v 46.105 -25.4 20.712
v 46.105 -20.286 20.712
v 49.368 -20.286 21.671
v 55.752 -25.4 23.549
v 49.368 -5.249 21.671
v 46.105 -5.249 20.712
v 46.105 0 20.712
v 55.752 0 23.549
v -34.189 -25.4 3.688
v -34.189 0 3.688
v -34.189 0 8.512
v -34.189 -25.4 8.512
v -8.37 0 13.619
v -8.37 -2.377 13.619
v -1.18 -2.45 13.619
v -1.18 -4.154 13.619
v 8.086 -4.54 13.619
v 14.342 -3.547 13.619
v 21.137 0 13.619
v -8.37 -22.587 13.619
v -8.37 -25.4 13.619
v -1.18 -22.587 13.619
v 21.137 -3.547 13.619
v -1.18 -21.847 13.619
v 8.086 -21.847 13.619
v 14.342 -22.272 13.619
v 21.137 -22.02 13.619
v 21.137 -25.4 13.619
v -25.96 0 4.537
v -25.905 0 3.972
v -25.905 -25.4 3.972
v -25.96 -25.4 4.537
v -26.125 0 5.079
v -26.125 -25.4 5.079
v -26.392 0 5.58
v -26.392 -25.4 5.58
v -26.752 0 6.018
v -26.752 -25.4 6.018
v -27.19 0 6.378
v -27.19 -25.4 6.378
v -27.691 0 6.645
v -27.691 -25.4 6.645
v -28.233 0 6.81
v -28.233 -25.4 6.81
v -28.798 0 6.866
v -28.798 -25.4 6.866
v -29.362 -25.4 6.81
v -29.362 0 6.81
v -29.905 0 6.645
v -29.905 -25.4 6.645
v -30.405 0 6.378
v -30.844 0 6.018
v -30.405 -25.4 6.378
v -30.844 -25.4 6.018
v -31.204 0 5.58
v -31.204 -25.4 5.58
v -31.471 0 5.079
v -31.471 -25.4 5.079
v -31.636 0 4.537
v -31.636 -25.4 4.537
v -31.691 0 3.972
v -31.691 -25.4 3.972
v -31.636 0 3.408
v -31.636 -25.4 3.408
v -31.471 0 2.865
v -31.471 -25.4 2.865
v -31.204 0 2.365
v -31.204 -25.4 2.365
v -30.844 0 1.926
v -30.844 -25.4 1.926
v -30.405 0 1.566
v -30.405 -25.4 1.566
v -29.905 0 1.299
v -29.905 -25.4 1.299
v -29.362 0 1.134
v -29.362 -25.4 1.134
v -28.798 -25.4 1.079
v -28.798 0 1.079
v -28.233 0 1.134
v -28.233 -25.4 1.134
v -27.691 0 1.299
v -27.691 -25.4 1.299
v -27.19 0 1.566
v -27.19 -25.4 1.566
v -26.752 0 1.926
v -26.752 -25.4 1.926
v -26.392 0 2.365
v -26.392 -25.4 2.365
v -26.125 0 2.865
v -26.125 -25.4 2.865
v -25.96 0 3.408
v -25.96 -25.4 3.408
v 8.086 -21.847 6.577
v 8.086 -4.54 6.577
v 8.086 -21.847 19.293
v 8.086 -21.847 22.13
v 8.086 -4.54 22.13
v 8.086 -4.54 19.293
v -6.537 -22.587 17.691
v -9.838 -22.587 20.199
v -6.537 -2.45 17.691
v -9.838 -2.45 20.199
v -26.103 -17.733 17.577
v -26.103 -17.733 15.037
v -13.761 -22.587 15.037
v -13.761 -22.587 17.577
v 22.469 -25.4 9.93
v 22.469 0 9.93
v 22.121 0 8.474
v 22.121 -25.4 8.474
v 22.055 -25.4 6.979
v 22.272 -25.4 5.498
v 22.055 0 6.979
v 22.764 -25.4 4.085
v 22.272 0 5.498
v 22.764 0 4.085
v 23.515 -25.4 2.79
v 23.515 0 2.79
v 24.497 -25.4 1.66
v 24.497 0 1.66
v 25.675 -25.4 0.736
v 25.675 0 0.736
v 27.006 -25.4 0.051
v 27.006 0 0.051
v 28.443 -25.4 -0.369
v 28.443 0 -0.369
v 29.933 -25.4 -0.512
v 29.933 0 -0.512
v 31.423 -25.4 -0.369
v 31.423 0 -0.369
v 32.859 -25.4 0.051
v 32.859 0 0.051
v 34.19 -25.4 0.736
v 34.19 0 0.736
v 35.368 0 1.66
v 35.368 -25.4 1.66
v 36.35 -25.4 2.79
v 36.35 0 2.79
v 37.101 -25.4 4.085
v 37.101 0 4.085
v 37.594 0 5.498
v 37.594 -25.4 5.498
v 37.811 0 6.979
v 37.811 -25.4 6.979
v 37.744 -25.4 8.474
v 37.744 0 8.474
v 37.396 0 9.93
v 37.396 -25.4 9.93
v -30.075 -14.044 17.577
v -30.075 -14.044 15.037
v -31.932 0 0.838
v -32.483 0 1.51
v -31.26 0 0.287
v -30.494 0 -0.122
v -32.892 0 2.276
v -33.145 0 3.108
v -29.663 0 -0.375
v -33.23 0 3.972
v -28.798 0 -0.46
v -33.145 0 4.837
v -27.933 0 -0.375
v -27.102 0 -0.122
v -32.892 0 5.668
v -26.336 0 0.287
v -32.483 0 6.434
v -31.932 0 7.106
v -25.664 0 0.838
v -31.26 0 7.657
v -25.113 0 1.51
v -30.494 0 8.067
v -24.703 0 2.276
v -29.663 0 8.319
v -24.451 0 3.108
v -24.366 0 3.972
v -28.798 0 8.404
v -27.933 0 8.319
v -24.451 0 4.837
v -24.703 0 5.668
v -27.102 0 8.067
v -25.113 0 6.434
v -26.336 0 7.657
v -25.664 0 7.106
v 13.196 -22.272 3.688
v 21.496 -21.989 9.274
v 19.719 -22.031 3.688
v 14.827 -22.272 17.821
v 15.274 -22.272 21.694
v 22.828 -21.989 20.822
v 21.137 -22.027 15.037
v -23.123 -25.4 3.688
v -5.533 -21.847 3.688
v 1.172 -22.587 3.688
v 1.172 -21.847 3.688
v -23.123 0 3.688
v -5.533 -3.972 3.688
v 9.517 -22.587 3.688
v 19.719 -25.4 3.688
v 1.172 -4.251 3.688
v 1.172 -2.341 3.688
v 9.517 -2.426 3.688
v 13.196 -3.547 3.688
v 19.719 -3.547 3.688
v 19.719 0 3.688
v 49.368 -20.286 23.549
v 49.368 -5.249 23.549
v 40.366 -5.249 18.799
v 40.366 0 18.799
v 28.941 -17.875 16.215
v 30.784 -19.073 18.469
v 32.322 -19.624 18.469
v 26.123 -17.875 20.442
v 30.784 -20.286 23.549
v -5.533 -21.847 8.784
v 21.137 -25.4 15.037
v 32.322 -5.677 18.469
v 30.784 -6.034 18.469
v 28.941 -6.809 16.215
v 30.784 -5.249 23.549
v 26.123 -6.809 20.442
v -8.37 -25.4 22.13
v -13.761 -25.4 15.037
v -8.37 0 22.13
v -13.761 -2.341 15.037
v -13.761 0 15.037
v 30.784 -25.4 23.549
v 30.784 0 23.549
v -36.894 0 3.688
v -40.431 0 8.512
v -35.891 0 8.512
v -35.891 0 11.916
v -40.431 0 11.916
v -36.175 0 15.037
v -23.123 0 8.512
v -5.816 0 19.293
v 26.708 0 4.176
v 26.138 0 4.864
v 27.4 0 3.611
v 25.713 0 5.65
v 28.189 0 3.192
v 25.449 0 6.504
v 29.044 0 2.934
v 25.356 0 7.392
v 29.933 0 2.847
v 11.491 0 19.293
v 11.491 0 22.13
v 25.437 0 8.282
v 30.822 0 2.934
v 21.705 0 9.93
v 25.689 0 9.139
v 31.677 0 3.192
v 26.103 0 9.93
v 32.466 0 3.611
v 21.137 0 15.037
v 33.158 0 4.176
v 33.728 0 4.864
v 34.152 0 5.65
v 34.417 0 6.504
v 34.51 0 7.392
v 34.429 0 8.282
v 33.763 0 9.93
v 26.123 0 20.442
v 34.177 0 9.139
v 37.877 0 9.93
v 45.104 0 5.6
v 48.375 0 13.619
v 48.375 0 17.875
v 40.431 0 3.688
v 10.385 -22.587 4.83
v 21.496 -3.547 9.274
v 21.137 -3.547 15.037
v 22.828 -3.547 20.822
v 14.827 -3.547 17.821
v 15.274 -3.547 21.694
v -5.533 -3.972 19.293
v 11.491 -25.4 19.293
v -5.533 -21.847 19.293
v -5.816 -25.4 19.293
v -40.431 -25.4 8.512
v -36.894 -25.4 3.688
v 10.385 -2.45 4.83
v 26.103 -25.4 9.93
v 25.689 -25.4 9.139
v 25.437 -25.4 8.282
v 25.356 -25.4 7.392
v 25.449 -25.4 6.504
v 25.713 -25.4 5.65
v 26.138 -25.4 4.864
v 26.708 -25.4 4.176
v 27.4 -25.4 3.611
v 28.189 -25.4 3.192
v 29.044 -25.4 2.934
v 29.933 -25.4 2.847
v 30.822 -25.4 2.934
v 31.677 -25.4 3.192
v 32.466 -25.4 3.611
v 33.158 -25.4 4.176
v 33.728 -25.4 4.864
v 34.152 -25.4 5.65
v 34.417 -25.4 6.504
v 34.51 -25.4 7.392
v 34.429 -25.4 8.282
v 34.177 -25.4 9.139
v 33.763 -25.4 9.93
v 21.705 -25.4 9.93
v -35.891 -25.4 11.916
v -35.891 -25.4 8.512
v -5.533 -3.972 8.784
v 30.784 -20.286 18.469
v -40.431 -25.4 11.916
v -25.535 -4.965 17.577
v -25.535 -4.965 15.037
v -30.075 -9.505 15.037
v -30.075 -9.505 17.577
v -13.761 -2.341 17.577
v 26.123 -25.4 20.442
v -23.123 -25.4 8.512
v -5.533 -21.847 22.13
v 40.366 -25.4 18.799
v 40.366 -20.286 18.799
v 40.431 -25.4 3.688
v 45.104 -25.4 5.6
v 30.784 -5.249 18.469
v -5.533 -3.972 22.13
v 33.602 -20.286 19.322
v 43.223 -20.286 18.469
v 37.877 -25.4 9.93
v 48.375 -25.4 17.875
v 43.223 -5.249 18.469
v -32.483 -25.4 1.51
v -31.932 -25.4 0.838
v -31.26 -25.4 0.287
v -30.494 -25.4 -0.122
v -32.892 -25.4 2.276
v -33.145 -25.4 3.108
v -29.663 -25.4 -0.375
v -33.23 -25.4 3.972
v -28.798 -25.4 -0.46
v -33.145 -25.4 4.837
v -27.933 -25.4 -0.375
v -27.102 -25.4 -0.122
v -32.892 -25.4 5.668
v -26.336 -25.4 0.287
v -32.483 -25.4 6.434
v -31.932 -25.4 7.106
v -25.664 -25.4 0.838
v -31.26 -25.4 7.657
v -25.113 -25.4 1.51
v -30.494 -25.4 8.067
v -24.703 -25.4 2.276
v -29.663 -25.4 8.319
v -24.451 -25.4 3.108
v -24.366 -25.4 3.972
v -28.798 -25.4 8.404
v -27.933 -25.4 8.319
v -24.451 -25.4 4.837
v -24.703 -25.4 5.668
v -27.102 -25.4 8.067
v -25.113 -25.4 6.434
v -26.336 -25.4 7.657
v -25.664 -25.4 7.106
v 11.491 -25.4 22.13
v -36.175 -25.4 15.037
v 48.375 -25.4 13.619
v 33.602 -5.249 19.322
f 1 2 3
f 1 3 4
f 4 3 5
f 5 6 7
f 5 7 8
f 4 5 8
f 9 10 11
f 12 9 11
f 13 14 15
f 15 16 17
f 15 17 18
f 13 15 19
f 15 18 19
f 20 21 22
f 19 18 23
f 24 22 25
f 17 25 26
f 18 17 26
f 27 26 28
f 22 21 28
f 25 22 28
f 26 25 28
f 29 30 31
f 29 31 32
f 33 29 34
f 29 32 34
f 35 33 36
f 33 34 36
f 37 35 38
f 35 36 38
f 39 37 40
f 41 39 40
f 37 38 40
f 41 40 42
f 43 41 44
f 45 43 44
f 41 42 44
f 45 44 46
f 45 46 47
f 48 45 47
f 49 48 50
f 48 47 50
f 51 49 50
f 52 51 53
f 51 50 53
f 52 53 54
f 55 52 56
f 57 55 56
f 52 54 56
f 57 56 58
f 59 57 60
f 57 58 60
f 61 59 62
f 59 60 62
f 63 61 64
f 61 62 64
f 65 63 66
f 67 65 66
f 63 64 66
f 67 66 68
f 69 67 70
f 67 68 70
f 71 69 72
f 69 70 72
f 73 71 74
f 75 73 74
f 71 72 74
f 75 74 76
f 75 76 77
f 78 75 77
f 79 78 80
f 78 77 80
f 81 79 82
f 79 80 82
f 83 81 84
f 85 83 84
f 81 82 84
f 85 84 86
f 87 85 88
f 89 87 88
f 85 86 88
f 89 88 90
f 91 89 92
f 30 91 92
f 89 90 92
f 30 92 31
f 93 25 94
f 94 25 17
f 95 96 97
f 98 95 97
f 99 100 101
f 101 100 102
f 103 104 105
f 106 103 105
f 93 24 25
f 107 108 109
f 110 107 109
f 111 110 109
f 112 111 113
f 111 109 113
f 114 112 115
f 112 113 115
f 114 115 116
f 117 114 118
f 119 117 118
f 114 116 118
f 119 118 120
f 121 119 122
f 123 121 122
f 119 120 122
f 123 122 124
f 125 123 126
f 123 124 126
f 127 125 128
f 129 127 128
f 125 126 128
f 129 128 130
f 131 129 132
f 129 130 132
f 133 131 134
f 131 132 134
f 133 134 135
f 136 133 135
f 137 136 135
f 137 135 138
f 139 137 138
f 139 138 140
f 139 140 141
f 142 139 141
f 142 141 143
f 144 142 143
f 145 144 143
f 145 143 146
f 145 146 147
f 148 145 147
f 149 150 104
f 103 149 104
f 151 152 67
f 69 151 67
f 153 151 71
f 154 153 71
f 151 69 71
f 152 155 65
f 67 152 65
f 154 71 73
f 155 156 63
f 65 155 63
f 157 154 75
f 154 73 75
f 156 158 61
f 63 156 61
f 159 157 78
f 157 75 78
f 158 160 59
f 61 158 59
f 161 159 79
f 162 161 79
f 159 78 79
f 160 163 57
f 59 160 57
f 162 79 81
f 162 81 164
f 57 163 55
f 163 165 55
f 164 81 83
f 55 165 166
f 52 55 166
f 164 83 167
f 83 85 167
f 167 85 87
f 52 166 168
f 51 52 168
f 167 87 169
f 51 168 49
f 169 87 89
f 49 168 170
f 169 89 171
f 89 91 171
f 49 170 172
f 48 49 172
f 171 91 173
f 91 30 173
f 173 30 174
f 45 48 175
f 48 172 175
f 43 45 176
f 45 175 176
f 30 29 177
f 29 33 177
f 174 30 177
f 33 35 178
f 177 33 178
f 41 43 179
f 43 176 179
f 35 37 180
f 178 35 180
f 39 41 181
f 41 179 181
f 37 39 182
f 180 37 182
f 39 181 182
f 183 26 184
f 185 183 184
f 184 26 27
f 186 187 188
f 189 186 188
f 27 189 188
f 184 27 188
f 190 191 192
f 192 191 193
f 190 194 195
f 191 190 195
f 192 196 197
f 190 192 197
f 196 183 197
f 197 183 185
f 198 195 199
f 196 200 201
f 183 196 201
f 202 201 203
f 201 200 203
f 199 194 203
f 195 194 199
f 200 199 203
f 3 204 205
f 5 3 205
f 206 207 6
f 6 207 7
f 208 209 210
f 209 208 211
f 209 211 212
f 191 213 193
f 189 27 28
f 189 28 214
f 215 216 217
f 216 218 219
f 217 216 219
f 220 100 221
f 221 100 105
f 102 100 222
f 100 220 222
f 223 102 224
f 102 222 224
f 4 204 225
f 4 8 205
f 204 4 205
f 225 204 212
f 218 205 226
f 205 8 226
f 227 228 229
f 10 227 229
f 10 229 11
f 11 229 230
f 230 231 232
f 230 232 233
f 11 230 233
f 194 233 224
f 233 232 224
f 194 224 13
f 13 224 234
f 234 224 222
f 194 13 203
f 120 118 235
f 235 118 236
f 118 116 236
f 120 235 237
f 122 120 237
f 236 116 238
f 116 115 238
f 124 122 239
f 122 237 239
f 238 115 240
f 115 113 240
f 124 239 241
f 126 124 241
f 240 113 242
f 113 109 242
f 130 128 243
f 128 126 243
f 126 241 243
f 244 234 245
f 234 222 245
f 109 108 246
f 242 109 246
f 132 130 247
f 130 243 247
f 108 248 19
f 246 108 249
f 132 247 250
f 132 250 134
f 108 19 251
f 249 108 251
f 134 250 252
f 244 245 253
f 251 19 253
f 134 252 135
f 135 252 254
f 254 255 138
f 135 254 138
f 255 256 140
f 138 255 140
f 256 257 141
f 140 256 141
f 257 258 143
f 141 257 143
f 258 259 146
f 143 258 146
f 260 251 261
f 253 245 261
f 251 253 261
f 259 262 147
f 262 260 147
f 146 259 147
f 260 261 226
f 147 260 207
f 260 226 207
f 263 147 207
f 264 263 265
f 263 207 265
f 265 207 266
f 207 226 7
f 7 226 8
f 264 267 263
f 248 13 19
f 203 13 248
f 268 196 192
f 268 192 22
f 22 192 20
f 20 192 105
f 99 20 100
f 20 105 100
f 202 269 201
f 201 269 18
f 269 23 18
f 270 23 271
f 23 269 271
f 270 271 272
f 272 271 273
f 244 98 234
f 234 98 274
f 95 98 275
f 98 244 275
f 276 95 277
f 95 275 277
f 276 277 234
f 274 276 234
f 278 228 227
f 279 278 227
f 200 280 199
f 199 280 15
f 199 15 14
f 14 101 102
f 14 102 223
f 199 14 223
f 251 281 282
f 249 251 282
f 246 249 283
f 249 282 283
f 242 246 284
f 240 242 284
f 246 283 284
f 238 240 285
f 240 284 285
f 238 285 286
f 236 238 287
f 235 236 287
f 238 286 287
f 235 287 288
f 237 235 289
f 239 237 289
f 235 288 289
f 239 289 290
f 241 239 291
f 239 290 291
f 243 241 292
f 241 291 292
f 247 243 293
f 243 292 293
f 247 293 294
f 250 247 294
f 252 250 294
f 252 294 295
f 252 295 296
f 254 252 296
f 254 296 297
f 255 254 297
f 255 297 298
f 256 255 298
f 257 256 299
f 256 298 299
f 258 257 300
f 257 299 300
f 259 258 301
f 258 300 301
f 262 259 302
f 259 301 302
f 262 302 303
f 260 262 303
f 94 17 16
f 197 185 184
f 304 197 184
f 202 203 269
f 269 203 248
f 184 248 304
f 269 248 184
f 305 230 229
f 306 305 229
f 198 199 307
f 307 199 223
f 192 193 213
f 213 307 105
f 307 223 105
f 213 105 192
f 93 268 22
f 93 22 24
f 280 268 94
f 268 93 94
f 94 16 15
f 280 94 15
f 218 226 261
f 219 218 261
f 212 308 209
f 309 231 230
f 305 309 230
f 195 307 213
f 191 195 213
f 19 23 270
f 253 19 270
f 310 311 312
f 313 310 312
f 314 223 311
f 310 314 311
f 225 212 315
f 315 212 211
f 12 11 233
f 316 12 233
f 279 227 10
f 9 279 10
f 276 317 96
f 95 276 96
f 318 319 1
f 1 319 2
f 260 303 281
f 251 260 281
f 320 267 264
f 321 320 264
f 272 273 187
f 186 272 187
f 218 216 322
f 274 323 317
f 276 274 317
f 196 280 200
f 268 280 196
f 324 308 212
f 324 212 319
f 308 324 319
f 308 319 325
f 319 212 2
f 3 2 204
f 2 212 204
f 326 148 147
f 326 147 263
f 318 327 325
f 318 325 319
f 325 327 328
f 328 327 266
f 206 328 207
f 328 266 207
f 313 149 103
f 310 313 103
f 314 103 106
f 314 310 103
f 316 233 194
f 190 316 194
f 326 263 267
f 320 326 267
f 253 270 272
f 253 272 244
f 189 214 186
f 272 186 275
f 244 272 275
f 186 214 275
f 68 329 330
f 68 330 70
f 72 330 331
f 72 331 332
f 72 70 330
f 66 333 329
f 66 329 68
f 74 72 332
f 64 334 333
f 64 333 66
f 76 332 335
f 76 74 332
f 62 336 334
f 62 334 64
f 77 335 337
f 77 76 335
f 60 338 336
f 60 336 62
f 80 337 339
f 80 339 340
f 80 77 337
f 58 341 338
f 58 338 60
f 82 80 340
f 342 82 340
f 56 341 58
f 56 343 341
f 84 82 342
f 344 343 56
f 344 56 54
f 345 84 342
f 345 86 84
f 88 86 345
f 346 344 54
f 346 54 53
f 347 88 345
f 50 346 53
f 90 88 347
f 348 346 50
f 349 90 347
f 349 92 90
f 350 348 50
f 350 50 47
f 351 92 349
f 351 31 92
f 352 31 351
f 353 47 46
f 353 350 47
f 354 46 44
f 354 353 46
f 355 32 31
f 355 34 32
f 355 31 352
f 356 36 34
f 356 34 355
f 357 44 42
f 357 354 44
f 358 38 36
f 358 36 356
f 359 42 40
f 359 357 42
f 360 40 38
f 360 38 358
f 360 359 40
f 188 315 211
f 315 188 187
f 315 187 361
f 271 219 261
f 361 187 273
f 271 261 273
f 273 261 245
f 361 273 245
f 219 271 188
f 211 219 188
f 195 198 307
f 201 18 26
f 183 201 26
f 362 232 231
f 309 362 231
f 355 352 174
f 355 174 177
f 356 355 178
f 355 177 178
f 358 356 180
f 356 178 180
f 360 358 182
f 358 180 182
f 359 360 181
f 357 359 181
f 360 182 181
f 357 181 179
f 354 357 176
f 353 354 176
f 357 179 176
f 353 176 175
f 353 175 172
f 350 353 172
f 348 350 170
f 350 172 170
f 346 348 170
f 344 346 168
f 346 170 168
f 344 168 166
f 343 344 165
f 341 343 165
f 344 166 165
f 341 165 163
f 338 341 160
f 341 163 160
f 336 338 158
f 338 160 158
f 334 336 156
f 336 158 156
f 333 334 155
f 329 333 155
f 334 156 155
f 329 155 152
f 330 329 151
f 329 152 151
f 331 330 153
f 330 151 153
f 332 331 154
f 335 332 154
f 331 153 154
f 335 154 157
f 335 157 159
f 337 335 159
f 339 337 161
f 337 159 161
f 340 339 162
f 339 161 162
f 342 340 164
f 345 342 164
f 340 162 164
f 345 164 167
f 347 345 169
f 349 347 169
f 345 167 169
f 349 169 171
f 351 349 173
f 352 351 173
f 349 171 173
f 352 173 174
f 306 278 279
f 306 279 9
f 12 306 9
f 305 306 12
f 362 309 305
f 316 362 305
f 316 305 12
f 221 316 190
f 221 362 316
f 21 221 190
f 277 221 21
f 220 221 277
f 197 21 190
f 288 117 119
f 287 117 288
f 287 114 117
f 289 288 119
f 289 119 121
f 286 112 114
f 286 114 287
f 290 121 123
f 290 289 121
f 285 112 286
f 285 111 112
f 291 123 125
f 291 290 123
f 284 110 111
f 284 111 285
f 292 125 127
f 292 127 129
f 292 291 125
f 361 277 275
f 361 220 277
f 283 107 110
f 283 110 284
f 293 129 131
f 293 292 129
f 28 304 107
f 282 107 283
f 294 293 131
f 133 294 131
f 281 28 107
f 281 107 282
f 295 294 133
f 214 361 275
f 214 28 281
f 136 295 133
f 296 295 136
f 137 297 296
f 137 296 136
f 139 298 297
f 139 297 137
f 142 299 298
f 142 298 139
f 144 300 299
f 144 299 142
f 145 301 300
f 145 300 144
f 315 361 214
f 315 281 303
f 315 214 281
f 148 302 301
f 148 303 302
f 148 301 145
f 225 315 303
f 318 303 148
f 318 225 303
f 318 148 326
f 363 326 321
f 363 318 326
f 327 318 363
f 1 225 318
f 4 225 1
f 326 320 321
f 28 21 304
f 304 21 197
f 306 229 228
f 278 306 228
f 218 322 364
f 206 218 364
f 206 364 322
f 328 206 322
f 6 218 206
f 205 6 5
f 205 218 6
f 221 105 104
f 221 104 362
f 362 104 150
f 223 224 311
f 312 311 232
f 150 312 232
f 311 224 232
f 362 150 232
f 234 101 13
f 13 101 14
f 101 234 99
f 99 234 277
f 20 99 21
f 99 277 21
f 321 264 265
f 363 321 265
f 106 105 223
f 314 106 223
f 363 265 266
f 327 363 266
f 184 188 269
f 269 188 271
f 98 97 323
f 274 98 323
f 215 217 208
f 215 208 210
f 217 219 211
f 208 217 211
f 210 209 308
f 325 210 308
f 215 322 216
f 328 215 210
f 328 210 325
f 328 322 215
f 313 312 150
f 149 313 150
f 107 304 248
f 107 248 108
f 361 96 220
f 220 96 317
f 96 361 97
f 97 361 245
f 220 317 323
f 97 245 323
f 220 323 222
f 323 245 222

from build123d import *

# Parameters (mm, degrees)
F0_R      = 4.4319021296
F1_DEPTH  = 25.4
F0_R_2    = 7.8883279383
F3_DEPTH  = 25.4
F5_DEPTH  = 25.4
F7_DEPTH  = 25.4
F9_DEPTH  = 25.4
F11_DEPTH = 25.4
F13_DEPTH = 25.4
F14_R     = 2.8934233722
F15_DEPTH = 25.4
F17_DEPTH = 2.54
F18_W     = 18.5838788748
F18_H     = 15.0373396464
F19_DEPTH = 5.08
F20_DEPTH = 10.16
F22_DEPTH = 5.08
F24_DEPTH = 25.4


with BuildPart() as f1:
    # F0 (on Front) → F1 (new body)
    with BuildSketch(Plane.XZ):
        with Locations((-28.7979263812, 3.972127568)):
            Circle(F0_R)
    extrude(amount=F1_DEPTH)

    # F14 (on face) → F15 (cut)
    with BuildSketch(Plane.XZ.offset(25.4)):
        with Locations((-28.7979263812, 3.972127568)):
            Circle(F14_R)
    extrude(amount=-F15_DEPTH, mode=Mode.SUBTRACT)


with BuildPart() as f1b:
    # F0 (on Front) → F1, piece 2 (new body)
    with BuildSketch(Plane.XZ):
        with Locations((29.9328211695, 7.3768086731)):
            Circle(F0_R_2)
    extrude(amount=F1_DEPTH)

    # F2 (on Front) → F3 (join)
    with BuildSketch(Plane.XZ):
        Polygon((-23.1234580278, 8.5117025301), (-23.1234580278, 3.6884043366), (19.718773663, 3.6884043366), (21.7048432678, 9.9303191528), (37.8770716488, 9.9303191528), (40.4305867851, 3.6884043366), (45.1037334939, 5.6001495632), (48.3748391271, 13.6187234893), (48.3748391271, 17.8745742887), (11.4907994866, 22.1304260194), (-8.3698406816, 22.1304260194), (-13.7605853379, 15.0373410434), (-36.1747331917, 15.0373410434), (-40.4305867851, 11.9163831696), (-35.8910113573, 11.9163831696), (-35.8910113573, 8.5117025301), (-40.4305867851, 8.5117025301), (-36.8935030616, 3.6884043366), (-34.1886691749, 3.6884043366), (-34.1886691749, 8.5117025301), align=None)
    extrude(amount=F3_DEPTH)

    # F4 (on Front) → F5 (join)
    with BuildSketch(Plane.XZ):
        Polygon((30.7839922607, 23.5490426421), (25.6769694388, 20.1443620026), (38.4445227683, 18.1582979858), (46.1050570011, 20.7118075341), (55.7516515255, 23.5490426421), align=None)
    extrude(amount=F5_DEPTH)

    # F6 (on face) → F7 (cut)
    with BuildSketch(Plane.XZ.offset(25.4)):
        Polygon((-5.8163292706, 19.2931909114), (-8.3698406816, 13.6187234893), (21.1373921484, 13.6187234893), (21.1373921484, 15.0373410434), (11.4907994866, 19.2931909114), align=None)
    extrude(amount=-F7_DEPTH, mode=Mode.SUBTRACT)

    # F8 (on face) → F9 (cut)
    with BuildSketch(Plane(origin=(-15.9666356705, 0, 12.1346432773), x_dir=(0, -1, 0), z_dir=(-0.7961621901, 0, 0.6050832728))):
        Polygon((22.5871372968, 10.1289832965), (2.4500952568, 10.1289832965), (2.3410865106, 3.6458623659), (22.5871372968, 3.6458623659), align=None)
    extrude(amount=-F9_DEPTH, mode=Mode.SUBTRACT)

    # F10 (on face) → F11 (cut)
    with BuildSketch(Plane(origin=(2.6709355753, 0, 23.1481028644), x_dir=(0.9934089328, 0, -0.1146241346), z_dir=(0.1146241346, 0, 0.9934089328))):
        Polygon((12.6866614446, -3.5465420224), (12.6866614446, -22.2722869366), (20.2912651002, -21.9885632396), (20.2912651002, -3.5465420224), align=None)
    extrude(amount=-F11_DEPTH, mode=Mode.SUBTRACT)

    # F12 (on face) → F13 (cut)
    with BuildSketch(Plane.XY.offset(22.1304260194)):
        Polygon((8.0861160532, -4.5395744964), (-5.5326065049, -3.972127568), (-5.5326065049, -21.8467023224), (8.0861160532, -21.8467023224), align=None)
    extrude(amount=-F13_DEPTH, mode=Mode.SUBTRACT)

    # F16 (on face) → F17 (join)
    with BuildSketch(Plane.XY.offset(15.0373410434)):
        Polygon((-13.7605853379, -22.5871372968), (-13.7605853379, -2.3410865106), (-25.5351066589, -4.9651586451), (-30.0746820867, -9.5047336072), (-30.0746820867, -14.0443081036), (-26.1025540531, -17.7327133715), align=None)
    extrude(amount=F17_DEPTH)

    # F18 (on face) → F19 (join)
    with BuildSketch(Plane.XY.offset(23.5490426421)):
        with Locations((40.0759316981, -12.7675530966)):
            Rectangle(F18_W, F18_H)
    extrude(amount=F19_DEPTH)

    # F20 (cut): a face of the model
    f20_faces = [f1b.faces().sort_by_distance(p)[0] for p in [
        (40.0759316981, -12.7675530966, 28.6290426421),
    ]]
    extrude(f20_faces, amount=-F20_DEPTH, mode=Mode.SUBTRACT)

    # F21 (on face) → F22 (cut)
    with BuildSketch(Plane(origin=(-1.3967945518, 0, 2.0951925918), x_dir=(0.8320503877, 0, 0.5547000562), z_dir=(-0.5547000562, 0, 0.8320503877))):
        Polygon((38.676487972, -5.2488832735), (33.0752558091, -6.8093617447), (33.0752558091, -17.8745742887), (38.676487972, -20.2862229198), align=None)
    extrude(amount=-F22_DEPTH, mode=Mode.SUBTRACT)

    # F23 (on face) → F24 (cut)
    with BuildSketch(Plane.XZ.offset(25.4)):
        with BuildLine():
            Line((33.7630845606, 9.9303191528), (26.1025559157, 9.9303191528))
            ThreePointArc((26.1025559157, 9.9303191528), (29.9328202382, 2.8467516557), (33.7630845606, 9.9303191528))
        make_face()
    extrude(amount=-F24_DEPTH, mode=Mode.SUBTRACT)


solid = Compound([f1.part, f1b.part])
